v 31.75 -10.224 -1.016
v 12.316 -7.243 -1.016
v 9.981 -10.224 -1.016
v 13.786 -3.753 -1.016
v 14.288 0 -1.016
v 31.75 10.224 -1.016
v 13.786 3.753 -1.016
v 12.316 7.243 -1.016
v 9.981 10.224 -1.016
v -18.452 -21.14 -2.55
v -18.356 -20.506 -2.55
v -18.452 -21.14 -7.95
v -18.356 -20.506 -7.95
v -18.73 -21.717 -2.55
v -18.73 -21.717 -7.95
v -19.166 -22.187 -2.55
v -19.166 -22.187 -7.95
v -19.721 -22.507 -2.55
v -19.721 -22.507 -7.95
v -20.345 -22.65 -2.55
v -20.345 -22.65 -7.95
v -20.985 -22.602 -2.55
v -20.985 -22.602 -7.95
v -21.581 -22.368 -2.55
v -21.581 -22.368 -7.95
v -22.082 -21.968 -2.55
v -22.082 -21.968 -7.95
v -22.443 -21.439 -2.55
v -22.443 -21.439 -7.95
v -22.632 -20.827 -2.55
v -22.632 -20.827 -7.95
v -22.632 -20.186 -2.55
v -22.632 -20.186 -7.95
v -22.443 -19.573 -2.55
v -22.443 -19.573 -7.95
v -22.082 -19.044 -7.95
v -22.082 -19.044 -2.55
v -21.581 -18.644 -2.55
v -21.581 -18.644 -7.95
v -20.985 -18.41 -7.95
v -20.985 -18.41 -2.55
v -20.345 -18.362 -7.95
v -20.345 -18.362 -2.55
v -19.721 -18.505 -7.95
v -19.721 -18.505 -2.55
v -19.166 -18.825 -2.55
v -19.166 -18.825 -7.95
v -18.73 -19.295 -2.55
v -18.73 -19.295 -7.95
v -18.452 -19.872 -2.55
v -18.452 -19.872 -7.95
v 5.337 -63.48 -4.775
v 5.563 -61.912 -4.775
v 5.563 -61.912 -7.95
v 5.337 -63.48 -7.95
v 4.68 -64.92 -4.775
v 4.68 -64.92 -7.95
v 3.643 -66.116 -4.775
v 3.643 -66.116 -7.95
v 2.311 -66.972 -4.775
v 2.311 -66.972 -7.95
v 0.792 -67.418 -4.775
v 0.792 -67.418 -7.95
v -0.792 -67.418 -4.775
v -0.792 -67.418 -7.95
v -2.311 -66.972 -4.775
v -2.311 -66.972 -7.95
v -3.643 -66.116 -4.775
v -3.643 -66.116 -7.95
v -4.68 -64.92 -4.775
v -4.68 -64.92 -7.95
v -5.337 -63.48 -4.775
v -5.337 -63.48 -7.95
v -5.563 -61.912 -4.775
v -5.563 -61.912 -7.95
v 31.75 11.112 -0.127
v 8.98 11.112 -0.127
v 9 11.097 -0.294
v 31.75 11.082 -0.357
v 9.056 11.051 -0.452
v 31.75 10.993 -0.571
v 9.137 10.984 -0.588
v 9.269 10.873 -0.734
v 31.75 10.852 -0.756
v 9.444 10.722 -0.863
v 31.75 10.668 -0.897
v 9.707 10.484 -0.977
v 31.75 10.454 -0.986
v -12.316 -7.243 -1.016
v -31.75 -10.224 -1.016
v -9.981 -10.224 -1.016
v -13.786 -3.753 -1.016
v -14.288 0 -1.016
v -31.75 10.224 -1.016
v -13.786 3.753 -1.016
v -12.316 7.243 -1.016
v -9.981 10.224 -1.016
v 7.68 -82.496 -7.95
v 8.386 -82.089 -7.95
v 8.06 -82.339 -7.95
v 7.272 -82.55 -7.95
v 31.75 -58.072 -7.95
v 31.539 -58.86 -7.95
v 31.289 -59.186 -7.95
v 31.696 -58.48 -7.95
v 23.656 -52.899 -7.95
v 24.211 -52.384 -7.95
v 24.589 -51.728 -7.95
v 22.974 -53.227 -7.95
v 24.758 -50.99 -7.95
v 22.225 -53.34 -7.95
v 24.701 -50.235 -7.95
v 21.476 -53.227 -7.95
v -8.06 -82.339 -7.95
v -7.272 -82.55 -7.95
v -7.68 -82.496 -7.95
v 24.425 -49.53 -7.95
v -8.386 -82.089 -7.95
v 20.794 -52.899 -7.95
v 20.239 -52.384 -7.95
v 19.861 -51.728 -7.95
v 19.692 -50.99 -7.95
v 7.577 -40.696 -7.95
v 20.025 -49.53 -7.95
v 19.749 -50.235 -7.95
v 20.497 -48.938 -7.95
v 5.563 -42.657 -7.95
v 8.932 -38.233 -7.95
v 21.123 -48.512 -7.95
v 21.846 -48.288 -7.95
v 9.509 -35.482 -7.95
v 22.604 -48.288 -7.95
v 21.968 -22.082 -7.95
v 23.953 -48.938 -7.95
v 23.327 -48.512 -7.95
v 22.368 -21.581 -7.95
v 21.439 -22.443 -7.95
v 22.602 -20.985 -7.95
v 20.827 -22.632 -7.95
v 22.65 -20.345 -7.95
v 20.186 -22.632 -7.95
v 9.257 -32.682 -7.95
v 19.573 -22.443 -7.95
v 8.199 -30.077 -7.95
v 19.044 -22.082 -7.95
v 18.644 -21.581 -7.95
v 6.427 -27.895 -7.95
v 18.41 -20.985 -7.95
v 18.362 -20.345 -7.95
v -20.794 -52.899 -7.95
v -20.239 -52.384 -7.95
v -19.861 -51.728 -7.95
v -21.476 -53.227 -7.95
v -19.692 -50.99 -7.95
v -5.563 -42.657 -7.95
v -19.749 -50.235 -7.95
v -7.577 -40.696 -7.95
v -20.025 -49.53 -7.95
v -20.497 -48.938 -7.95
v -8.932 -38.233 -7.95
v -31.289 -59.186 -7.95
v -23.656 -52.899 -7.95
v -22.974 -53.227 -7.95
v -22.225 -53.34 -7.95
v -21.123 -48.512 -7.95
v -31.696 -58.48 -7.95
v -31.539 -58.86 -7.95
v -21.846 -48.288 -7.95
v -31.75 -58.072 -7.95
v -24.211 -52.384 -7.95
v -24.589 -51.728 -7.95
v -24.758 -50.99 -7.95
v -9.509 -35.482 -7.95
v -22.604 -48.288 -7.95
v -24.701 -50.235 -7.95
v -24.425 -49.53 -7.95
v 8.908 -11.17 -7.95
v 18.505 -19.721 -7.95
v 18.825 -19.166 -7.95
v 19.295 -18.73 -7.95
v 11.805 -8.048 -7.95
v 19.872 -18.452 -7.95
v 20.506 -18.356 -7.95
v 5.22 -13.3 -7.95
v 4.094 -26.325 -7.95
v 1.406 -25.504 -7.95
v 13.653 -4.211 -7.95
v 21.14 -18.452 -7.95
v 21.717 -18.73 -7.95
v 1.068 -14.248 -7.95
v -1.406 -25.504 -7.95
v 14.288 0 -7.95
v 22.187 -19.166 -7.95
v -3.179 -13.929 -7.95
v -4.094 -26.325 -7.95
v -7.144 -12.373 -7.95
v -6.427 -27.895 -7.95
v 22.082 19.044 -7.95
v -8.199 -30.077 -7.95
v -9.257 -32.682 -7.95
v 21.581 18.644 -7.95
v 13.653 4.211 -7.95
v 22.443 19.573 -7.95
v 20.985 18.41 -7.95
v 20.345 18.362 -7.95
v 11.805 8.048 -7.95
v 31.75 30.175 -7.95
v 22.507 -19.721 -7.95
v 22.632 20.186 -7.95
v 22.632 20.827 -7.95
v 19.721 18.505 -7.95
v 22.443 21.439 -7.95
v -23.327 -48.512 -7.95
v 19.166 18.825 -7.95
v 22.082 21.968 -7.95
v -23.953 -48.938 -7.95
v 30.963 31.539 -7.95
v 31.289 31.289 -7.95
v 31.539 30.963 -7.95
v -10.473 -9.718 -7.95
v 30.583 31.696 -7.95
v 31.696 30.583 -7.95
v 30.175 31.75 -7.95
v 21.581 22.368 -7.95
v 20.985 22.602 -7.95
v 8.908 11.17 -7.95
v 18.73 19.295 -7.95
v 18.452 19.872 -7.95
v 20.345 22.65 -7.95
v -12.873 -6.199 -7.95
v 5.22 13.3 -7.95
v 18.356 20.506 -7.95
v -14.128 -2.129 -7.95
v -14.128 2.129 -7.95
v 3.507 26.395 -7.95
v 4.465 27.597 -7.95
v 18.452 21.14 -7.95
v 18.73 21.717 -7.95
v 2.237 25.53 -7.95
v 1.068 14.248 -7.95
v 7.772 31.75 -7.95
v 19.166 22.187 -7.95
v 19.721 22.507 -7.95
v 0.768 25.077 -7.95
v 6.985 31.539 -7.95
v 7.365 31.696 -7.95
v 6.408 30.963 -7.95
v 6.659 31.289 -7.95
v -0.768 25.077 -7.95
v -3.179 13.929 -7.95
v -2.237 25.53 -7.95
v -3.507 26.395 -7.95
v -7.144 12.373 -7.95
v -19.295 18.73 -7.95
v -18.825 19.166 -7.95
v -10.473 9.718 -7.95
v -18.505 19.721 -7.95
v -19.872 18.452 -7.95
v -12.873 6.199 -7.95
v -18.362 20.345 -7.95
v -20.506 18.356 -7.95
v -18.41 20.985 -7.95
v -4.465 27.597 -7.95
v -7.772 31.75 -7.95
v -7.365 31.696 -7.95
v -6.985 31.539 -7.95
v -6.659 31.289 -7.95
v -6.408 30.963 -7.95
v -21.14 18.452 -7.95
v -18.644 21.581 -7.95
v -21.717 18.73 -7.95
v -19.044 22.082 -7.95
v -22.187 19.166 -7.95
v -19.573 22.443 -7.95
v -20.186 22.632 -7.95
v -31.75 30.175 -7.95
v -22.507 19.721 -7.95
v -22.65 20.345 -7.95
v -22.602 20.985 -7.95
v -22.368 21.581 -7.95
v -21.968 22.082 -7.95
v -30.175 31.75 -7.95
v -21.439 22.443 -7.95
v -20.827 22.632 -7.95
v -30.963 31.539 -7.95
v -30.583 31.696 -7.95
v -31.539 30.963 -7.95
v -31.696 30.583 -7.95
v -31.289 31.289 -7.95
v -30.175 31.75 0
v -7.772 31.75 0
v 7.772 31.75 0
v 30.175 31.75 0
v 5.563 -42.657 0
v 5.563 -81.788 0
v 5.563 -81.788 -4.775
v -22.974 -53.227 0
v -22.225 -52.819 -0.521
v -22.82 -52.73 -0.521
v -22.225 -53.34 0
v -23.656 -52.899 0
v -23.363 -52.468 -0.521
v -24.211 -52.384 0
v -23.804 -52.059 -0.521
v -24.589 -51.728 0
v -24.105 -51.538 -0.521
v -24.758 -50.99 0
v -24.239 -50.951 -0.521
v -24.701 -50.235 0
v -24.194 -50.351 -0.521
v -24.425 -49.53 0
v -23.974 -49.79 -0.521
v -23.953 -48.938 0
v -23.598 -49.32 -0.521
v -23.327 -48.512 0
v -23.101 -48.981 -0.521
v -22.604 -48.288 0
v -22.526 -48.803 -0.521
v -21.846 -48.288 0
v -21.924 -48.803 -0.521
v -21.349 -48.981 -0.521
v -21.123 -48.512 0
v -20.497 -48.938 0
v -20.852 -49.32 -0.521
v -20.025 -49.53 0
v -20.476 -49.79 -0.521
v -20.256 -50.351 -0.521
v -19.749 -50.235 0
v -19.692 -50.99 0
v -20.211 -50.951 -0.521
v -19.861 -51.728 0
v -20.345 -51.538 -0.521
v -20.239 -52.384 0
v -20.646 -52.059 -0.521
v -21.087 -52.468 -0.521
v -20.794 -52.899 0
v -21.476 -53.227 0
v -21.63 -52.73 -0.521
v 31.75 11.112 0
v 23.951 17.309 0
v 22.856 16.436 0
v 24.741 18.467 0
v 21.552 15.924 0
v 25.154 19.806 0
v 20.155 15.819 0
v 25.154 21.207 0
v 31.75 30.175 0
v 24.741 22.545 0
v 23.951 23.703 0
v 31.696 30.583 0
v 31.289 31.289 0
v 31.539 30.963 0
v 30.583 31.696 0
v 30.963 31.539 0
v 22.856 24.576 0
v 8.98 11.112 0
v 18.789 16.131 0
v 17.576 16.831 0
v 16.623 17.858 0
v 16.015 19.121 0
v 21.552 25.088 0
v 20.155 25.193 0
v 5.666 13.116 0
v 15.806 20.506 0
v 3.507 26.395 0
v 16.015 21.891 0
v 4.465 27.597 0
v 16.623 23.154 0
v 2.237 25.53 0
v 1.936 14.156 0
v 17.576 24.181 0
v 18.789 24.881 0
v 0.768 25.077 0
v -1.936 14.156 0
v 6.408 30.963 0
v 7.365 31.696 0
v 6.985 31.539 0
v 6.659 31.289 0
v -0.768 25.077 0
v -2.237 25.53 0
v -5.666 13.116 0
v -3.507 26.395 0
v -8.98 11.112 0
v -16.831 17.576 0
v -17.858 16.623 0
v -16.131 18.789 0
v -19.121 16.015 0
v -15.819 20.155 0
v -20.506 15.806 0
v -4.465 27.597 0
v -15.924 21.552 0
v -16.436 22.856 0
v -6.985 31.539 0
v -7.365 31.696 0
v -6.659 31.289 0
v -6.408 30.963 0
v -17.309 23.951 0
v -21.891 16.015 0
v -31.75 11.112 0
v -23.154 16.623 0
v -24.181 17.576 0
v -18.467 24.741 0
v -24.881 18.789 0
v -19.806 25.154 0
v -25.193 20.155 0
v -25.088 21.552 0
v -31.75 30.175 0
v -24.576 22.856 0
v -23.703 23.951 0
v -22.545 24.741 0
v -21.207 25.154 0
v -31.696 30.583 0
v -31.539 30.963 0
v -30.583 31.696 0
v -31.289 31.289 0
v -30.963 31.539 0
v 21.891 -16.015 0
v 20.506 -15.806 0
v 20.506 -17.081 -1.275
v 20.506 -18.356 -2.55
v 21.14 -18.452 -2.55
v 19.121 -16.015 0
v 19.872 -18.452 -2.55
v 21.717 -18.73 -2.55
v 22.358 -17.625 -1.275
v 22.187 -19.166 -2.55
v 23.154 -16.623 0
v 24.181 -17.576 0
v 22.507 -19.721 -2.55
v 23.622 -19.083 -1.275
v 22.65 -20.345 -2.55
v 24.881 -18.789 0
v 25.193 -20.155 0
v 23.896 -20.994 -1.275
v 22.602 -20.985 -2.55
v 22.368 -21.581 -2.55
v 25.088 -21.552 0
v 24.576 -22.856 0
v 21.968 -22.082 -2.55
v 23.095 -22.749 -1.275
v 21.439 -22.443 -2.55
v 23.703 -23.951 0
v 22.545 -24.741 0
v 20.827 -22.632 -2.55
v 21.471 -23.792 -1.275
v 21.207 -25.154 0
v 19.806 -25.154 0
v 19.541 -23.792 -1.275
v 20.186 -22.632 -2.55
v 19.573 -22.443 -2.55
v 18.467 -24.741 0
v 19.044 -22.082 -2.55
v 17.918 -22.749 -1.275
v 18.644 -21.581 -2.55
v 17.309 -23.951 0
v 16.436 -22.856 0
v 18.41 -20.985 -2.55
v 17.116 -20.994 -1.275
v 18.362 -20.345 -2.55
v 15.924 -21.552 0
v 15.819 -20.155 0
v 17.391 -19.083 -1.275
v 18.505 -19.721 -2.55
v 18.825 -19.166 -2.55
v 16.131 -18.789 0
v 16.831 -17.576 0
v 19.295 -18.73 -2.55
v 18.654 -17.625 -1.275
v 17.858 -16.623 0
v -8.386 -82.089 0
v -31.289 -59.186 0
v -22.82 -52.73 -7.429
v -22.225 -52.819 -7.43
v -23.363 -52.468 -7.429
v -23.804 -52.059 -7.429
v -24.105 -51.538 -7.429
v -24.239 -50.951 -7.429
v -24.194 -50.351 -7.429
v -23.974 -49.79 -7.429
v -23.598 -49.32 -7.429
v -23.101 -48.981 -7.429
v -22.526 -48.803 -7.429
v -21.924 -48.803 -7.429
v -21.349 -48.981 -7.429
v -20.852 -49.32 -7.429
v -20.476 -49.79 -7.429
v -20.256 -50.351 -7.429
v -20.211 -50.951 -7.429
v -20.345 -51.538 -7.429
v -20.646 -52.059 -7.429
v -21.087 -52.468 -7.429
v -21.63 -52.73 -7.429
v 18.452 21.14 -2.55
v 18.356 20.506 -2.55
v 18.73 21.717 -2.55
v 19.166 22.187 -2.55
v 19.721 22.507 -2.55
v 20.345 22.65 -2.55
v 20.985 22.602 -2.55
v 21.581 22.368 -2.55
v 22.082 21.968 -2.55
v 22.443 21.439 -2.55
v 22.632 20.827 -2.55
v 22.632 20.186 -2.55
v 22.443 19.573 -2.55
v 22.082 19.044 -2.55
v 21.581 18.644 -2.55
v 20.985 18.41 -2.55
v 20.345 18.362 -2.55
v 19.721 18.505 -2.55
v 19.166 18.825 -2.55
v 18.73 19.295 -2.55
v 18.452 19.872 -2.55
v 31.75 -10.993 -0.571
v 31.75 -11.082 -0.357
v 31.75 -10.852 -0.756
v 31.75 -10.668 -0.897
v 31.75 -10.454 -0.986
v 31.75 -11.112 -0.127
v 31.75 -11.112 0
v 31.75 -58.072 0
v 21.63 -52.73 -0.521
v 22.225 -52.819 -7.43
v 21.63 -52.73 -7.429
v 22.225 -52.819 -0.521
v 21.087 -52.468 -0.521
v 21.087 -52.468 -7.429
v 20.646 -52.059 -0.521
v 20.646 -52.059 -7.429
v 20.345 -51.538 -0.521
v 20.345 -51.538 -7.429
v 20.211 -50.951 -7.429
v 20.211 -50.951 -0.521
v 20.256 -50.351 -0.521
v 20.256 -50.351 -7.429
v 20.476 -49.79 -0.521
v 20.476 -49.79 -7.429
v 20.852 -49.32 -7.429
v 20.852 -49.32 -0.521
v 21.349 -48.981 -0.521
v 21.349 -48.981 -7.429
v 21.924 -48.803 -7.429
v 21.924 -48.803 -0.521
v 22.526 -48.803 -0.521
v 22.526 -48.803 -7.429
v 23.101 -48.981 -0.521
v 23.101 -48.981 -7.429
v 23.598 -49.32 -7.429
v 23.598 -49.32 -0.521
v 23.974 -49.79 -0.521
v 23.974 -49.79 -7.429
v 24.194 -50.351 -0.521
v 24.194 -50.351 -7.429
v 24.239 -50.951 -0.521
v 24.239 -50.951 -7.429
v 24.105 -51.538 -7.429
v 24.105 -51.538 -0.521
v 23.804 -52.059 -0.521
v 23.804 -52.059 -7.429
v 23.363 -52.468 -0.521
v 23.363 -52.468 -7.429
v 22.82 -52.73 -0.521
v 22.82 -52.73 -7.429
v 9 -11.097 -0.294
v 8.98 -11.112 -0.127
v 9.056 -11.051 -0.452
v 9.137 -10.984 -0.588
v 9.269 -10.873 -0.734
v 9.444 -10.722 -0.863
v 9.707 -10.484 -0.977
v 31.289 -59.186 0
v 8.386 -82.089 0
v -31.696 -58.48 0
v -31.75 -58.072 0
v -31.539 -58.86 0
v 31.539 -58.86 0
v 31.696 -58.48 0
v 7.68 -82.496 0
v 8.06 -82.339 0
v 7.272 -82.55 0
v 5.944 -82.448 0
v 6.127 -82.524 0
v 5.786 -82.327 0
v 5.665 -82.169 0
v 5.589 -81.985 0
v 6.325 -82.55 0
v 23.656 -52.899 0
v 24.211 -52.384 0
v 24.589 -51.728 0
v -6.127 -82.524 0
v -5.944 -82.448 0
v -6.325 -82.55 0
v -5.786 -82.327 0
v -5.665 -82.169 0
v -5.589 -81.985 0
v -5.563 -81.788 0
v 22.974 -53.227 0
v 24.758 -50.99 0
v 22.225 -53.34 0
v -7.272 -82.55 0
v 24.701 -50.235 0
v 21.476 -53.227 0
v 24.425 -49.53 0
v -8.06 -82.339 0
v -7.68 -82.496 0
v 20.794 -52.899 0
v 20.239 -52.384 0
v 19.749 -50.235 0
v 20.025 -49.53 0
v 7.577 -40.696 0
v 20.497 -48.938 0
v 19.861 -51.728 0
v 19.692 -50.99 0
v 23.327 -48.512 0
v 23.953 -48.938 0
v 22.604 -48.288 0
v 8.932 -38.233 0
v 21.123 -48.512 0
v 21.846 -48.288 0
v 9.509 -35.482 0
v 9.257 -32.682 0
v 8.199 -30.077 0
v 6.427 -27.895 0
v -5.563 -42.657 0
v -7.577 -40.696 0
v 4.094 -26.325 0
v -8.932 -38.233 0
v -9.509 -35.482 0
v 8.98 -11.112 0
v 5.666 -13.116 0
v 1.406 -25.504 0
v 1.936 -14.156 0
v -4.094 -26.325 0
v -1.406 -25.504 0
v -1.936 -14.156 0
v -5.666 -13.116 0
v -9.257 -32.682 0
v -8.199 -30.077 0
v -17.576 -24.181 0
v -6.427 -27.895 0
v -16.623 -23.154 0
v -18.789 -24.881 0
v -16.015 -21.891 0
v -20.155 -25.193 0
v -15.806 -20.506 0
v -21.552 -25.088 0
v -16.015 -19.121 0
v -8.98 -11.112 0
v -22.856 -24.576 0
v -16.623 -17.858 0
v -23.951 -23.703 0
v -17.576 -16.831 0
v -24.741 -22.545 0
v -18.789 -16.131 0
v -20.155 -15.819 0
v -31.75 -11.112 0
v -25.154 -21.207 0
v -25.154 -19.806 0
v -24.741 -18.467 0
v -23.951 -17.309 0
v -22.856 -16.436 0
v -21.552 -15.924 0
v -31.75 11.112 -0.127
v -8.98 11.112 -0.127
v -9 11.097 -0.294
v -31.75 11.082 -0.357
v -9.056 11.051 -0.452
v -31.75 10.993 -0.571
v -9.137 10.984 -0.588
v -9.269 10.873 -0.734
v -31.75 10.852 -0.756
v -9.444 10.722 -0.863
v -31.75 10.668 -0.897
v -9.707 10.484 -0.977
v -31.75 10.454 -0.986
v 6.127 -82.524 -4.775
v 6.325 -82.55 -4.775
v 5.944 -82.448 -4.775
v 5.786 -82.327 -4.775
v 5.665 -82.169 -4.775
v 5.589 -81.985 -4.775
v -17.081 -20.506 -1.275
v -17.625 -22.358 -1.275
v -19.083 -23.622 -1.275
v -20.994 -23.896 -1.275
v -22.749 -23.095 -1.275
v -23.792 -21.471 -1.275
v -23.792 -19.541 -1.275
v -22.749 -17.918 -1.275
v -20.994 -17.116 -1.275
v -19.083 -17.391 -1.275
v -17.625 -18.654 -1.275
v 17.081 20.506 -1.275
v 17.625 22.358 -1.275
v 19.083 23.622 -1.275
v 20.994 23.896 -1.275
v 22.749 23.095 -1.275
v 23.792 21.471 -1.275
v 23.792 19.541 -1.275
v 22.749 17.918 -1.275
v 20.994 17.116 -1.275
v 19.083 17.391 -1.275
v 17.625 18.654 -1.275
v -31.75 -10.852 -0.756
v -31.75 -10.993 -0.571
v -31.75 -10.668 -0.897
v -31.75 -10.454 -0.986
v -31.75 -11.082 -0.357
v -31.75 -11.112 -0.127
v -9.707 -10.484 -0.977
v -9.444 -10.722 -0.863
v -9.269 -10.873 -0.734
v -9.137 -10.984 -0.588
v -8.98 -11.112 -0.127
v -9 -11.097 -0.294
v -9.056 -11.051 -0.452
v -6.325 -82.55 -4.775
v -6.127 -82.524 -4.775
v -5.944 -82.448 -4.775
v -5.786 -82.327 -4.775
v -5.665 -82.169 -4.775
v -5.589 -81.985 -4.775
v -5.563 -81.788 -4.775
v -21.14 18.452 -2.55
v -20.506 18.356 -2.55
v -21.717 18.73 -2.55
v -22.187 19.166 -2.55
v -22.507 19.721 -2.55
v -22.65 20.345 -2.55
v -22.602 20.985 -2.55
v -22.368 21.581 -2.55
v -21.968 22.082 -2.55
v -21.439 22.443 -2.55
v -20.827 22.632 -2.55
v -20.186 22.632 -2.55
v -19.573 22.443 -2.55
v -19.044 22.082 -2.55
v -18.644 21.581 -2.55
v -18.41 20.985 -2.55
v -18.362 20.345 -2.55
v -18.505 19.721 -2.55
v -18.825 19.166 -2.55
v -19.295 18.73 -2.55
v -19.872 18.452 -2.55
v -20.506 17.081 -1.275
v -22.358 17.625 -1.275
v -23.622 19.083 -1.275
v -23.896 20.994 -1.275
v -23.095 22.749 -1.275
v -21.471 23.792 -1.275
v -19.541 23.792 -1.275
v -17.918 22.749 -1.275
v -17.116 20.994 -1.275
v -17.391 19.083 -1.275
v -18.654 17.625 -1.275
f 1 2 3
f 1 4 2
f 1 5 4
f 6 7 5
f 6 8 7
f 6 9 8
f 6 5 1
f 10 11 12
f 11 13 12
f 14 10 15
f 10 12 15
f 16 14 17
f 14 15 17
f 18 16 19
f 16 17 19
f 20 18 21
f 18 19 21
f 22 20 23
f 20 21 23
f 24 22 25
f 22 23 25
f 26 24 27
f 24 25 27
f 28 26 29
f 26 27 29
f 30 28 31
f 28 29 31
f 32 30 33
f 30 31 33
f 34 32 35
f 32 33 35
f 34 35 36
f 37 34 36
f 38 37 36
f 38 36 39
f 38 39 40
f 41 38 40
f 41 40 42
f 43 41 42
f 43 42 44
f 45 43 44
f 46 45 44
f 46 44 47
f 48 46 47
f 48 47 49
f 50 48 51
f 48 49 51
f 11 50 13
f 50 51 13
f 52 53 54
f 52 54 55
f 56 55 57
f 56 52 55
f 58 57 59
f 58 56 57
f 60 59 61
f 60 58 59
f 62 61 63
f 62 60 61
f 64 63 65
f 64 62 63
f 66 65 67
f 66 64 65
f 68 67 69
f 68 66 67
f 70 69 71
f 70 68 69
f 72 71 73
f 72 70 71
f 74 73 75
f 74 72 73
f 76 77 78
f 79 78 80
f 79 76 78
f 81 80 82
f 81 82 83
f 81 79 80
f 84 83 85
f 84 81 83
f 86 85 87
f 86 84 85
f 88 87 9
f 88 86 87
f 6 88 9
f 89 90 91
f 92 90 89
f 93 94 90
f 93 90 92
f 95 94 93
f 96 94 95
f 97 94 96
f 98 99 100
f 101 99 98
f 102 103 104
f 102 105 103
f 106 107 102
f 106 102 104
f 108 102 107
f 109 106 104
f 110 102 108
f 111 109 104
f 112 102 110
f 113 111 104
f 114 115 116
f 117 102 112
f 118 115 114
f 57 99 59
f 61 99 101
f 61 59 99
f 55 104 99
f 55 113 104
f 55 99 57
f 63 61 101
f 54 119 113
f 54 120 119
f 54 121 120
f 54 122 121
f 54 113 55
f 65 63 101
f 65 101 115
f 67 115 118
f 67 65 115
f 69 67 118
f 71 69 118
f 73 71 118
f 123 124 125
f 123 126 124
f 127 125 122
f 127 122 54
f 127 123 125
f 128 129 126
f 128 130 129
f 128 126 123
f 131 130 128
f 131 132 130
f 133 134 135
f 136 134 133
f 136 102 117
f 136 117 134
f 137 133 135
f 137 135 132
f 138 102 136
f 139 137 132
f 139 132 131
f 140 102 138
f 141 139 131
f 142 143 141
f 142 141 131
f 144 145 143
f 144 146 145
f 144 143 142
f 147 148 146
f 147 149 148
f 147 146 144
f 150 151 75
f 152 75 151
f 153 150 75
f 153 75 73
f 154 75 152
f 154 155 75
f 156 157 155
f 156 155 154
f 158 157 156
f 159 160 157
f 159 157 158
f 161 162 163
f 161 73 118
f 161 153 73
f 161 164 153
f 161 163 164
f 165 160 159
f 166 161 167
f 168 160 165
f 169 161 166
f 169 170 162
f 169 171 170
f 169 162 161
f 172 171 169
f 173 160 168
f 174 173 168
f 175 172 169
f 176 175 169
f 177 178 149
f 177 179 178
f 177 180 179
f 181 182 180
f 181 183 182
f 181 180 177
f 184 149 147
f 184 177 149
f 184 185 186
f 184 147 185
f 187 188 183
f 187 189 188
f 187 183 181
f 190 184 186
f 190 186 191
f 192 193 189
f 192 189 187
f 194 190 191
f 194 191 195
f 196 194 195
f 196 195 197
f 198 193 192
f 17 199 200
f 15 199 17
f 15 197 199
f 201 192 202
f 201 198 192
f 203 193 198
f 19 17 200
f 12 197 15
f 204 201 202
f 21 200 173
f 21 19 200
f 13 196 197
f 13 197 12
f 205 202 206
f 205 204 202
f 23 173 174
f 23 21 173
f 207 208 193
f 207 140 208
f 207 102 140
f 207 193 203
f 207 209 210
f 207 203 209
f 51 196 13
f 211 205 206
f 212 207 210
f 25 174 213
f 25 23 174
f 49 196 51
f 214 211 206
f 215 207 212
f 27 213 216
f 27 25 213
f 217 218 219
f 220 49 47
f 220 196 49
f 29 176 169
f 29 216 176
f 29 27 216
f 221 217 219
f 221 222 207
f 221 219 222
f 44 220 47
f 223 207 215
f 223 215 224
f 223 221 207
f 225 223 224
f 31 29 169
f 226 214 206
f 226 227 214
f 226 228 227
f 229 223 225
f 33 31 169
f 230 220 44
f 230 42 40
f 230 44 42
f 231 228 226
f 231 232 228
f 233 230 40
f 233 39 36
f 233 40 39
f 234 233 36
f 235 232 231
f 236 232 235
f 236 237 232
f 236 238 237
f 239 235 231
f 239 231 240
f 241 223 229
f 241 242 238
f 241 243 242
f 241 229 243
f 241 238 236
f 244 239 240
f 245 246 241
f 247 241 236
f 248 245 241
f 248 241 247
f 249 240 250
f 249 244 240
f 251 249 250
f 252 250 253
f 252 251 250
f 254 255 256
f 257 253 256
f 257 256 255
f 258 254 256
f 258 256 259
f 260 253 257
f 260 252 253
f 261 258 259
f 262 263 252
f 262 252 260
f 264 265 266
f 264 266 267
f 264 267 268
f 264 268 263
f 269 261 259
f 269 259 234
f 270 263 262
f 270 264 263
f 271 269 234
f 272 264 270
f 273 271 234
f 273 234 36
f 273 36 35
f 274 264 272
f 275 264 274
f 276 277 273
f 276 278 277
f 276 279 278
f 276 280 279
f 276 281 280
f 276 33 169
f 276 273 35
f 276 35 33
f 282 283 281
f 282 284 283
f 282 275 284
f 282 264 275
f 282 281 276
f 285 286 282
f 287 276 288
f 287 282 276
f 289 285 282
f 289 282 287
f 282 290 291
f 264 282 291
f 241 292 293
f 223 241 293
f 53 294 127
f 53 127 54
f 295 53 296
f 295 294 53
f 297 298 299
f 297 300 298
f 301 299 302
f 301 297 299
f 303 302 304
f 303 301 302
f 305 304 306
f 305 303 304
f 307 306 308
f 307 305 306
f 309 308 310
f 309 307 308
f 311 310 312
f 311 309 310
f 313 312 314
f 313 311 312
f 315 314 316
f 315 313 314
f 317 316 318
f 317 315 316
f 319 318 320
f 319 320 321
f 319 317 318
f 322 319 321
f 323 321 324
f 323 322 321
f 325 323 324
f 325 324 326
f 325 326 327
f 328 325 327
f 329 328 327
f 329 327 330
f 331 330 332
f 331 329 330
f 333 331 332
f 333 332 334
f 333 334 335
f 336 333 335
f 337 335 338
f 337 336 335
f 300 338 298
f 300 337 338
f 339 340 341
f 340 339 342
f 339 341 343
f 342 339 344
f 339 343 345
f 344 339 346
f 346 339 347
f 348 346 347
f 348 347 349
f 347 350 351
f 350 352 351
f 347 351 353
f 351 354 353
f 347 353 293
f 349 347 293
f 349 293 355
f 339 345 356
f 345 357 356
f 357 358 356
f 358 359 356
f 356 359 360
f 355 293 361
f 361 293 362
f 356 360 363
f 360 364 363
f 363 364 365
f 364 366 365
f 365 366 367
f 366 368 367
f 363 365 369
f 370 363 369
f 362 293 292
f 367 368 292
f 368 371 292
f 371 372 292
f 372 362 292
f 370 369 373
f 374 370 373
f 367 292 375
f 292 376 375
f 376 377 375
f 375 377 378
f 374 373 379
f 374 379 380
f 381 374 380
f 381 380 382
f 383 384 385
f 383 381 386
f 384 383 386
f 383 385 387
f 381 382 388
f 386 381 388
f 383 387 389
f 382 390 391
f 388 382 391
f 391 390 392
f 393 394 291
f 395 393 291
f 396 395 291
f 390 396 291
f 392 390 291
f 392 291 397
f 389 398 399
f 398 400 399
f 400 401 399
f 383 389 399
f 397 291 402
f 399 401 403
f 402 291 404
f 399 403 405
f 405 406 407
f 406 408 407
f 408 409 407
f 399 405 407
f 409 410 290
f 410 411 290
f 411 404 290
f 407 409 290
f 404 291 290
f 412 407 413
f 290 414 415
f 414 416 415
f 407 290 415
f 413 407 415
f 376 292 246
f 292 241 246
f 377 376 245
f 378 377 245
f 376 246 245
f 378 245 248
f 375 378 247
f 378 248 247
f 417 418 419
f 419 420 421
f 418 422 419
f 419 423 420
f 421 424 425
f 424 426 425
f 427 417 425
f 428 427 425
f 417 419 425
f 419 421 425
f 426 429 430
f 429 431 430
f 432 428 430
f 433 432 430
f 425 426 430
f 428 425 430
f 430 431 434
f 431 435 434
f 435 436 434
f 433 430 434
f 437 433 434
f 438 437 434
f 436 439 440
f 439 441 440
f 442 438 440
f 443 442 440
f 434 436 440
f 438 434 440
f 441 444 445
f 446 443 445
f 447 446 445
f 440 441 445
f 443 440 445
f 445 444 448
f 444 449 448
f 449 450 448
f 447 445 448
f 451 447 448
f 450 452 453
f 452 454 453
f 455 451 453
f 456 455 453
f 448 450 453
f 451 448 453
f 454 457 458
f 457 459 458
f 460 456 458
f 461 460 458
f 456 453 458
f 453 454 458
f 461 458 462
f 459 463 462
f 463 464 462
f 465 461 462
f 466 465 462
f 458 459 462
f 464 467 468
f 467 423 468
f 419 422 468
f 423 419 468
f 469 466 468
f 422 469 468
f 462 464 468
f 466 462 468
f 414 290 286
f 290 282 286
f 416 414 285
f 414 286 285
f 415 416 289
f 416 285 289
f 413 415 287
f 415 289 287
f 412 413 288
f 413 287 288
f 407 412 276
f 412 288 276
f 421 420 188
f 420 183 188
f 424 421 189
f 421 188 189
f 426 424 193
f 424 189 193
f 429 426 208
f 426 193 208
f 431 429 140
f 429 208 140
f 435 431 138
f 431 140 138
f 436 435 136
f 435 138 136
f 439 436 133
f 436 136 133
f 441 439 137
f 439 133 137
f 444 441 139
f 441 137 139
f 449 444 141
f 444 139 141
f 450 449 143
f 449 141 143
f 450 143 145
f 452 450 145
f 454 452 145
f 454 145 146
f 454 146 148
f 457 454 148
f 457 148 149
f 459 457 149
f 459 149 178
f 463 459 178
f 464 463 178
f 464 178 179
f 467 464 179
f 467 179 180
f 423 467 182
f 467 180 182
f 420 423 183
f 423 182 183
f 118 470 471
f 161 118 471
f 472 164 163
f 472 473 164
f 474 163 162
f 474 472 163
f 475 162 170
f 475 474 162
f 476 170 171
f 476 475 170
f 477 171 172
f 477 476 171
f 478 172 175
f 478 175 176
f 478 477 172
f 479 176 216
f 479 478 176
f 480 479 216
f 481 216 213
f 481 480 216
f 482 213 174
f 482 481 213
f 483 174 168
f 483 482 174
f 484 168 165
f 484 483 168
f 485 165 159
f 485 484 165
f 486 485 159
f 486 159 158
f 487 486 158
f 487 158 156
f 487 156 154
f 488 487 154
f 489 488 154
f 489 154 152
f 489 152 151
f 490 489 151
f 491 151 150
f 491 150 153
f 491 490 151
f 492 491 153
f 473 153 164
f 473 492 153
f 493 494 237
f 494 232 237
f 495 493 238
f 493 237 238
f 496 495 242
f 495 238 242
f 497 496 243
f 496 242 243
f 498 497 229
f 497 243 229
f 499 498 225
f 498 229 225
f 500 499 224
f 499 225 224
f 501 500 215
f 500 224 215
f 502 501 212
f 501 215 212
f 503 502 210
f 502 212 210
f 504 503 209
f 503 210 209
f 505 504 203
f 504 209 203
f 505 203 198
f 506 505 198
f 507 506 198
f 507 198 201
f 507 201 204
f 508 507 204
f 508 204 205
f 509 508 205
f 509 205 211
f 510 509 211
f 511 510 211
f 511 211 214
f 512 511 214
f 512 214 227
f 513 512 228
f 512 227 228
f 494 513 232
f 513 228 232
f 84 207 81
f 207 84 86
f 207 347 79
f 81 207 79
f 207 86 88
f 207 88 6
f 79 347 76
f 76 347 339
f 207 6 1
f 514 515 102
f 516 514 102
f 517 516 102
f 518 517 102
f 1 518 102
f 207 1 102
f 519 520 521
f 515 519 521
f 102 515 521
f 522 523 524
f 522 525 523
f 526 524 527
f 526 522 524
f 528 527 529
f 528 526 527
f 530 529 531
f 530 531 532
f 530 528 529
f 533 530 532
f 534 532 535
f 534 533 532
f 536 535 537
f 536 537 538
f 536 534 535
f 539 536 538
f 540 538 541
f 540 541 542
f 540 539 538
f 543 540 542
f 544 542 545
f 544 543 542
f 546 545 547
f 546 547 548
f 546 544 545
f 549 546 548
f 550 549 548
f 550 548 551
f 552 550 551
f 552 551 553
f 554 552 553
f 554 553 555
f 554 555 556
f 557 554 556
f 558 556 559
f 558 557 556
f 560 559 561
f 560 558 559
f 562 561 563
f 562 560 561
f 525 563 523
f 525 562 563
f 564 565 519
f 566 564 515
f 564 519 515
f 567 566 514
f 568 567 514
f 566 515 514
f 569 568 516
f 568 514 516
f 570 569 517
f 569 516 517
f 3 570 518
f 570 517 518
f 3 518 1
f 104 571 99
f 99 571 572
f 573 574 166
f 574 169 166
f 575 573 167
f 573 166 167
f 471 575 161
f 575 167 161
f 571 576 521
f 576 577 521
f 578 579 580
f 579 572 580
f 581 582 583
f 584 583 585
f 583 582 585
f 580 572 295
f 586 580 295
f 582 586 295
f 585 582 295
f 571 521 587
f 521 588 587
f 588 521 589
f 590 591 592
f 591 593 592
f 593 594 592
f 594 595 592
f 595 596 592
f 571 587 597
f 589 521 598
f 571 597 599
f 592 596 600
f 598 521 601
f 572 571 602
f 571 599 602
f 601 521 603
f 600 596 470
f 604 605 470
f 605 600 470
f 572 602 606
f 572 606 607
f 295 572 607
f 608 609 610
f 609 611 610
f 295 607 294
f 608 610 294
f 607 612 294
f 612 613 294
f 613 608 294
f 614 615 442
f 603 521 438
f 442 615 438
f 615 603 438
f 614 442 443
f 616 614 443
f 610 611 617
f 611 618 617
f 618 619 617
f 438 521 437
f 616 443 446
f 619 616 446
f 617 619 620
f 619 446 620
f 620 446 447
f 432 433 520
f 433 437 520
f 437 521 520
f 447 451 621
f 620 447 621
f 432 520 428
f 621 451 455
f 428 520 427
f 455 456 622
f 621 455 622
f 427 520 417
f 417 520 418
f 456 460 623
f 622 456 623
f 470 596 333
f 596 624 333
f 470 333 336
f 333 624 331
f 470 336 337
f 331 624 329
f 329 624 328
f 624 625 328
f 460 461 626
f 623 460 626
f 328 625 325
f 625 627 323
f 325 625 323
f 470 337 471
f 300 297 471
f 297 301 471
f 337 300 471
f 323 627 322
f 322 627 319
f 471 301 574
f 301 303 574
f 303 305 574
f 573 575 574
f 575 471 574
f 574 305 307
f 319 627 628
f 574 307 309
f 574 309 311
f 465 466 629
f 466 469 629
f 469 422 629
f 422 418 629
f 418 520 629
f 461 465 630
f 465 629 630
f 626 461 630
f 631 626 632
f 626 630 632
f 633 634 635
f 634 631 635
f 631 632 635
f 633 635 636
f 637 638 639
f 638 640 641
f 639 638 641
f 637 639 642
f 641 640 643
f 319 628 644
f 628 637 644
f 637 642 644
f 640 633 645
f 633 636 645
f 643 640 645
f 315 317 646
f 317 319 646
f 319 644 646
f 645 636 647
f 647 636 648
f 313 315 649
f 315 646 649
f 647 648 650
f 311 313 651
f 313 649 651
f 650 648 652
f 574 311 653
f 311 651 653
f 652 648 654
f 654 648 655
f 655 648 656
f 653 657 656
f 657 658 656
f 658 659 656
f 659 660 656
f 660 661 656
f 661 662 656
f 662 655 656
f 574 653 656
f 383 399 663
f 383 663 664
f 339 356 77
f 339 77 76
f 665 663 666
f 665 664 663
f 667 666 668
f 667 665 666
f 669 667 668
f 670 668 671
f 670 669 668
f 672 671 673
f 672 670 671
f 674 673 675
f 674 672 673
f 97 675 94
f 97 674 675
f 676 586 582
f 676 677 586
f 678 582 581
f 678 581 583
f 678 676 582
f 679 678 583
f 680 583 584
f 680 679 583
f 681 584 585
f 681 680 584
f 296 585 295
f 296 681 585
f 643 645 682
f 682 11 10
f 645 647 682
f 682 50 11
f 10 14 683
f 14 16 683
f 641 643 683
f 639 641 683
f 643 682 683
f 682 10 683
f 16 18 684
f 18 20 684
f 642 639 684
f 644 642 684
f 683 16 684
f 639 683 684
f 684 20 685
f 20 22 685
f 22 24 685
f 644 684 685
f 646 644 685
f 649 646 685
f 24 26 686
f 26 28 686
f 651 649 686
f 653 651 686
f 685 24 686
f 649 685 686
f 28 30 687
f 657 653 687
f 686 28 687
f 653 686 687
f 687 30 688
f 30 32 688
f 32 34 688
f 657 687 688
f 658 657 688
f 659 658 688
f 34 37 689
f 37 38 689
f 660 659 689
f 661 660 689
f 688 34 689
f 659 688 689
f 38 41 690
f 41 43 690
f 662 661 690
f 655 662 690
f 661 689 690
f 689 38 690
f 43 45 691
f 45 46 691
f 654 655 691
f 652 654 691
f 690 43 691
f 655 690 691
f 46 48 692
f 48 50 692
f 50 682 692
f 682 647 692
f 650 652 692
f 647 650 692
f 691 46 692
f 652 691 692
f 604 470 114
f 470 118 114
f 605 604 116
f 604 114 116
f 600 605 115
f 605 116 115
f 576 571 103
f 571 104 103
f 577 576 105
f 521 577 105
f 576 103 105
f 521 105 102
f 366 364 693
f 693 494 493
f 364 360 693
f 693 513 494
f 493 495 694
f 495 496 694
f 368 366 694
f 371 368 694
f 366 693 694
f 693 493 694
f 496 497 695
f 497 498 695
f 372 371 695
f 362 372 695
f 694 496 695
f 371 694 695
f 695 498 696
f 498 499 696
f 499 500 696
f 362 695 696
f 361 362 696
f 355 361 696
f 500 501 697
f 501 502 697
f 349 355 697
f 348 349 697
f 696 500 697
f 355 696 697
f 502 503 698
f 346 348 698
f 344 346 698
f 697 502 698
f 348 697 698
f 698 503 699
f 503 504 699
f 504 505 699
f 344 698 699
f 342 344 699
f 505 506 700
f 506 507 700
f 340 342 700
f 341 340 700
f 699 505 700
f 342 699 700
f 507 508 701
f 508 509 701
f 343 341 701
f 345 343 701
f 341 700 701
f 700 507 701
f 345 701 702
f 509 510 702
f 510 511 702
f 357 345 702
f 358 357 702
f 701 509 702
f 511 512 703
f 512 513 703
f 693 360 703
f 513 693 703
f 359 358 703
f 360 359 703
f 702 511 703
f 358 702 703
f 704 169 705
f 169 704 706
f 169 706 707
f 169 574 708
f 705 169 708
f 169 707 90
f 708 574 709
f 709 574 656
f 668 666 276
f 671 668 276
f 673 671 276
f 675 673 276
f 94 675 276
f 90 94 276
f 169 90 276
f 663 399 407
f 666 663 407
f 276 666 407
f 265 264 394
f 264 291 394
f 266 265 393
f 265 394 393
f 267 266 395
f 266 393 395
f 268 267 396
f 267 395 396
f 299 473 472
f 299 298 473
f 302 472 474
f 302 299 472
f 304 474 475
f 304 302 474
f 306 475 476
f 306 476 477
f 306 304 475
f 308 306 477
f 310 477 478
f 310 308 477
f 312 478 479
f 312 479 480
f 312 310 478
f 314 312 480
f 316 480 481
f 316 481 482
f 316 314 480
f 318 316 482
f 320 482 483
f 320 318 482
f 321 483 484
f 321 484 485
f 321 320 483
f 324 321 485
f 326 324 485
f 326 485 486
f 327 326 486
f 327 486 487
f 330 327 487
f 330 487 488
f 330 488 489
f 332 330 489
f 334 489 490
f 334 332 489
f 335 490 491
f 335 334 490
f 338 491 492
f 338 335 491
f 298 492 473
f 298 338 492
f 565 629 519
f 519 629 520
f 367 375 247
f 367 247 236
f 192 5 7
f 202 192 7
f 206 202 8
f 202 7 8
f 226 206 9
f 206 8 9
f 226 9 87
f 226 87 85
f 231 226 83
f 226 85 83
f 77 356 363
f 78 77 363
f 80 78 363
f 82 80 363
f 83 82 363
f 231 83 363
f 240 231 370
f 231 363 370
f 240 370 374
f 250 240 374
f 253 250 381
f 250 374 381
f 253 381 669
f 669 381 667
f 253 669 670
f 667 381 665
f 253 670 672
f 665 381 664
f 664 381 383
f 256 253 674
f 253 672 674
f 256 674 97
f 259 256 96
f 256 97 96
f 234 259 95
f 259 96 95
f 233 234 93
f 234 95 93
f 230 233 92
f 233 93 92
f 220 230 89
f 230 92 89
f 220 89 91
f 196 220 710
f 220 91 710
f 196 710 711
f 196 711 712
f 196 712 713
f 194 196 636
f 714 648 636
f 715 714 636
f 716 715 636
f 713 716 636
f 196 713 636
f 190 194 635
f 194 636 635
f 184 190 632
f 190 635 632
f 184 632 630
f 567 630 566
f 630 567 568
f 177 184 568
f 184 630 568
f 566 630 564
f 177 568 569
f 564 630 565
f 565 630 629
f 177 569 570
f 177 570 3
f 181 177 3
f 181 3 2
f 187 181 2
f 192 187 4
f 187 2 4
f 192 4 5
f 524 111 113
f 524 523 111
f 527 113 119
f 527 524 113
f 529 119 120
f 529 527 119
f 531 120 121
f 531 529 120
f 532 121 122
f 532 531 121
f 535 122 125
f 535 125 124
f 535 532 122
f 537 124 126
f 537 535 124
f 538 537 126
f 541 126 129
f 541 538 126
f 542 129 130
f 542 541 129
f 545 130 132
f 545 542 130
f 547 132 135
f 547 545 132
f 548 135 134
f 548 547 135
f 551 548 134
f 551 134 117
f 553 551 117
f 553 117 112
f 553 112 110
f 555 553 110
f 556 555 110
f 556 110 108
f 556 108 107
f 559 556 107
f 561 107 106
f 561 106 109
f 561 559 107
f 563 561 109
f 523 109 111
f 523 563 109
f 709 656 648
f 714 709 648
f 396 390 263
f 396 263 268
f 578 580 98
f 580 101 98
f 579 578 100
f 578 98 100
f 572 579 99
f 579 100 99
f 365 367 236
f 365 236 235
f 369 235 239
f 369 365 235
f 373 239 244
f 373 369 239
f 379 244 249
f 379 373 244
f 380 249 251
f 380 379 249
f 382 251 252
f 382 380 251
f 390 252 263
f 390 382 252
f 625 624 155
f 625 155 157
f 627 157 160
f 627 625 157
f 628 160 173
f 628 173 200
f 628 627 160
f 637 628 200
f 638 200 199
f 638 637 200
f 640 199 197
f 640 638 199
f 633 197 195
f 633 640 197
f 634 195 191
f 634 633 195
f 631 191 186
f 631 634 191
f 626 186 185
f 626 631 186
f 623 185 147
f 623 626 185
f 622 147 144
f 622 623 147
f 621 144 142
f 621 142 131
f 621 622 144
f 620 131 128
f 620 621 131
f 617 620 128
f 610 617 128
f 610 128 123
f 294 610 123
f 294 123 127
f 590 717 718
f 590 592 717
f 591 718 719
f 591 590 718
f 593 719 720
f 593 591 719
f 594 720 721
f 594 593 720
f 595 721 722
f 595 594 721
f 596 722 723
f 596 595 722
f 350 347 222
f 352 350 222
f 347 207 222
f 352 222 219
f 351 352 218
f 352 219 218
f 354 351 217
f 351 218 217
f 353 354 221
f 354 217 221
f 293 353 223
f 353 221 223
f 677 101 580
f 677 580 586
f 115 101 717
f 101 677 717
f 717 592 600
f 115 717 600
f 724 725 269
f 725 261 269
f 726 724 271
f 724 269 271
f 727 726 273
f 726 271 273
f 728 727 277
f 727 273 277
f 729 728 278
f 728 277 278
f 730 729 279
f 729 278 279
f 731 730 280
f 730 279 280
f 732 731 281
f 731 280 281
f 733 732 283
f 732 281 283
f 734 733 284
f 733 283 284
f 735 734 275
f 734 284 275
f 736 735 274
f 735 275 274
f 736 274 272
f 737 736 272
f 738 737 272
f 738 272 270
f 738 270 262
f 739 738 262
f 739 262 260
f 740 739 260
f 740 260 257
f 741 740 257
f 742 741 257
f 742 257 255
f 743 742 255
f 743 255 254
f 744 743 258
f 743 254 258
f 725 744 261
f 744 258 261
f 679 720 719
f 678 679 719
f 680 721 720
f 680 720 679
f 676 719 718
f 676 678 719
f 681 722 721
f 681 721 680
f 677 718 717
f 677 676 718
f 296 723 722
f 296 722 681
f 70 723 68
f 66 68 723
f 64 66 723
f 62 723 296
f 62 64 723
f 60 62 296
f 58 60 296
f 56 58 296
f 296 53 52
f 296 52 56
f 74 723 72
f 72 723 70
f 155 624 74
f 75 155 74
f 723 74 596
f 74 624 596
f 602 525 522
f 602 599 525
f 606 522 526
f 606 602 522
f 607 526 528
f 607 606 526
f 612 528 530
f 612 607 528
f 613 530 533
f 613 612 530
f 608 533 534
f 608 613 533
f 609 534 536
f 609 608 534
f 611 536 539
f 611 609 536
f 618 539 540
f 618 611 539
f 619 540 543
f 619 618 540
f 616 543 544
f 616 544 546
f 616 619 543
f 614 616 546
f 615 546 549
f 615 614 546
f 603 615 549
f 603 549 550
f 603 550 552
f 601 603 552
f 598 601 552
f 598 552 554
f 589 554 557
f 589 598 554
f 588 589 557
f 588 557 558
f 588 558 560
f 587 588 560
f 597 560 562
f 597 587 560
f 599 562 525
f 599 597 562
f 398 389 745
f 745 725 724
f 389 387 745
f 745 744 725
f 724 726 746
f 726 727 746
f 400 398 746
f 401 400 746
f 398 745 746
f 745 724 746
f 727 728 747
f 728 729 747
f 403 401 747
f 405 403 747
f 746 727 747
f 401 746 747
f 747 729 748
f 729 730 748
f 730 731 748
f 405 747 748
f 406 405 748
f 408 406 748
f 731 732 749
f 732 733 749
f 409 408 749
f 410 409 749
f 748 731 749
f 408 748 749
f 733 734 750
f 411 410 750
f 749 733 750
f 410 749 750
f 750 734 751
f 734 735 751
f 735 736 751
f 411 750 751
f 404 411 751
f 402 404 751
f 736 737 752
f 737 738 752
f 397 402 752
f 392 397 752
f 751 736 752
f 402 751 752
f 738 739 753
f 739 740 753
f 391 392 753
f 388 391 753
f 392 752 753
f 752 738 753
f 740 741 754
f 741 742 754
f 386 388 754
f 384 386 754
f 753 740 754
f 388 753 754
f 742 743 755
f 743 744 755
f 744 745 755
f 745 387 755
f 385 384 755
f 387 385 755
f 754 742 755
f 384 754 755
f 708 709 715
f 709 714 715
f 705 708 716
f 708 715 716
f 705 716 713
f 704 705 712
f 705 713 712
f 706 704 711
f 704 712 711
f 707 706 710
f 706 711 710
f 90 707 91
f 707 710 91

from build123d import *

# Parameters (mm, degrees)
SKETCH1_R                                       = 14.2875
BOSS_EXTRUDE1_DEPTH                             = 7.9502
CUT_EXTRUDE1_DEPTH                              = 4.7752
CSK_FOR_M4_FLAT_HEAD_MACHINE_SCREW1_D           = 4.3
CSK_FOR_M4_FLAT_HEAD_MACHINE_SCREW1_CSINK_D     = 9.4
CSK_FOR_M4_FLAT_HEAD_MACHINE_SCREW1_CSINK_ANGLE = 90
CIRPATTERN1_COUNT                               = 4
F_10_32_TAPPED_HOLE1_AT_2_COUNT                 = 2
F_10_32_TAPPED_HOLE1_AT_2_PITCH                 = 44.45
CUT_EXTRUDE2_DEPTH                              = 89.801861918
FILLET1_R                                       = 1.5748
FILLET2_R                                       = 0.762
SKETCH12_W                                      = 73.210736231
SKETCH12_H                                      = 22.225
CUT_EXTRUDE3_DEPTH                              = 1.016
FILLET3_R                                       = 0.889


with BuildPart() as part:
    # Sketch1 → Boss-Extrude1 (new body)
    with BuildSketch(Plane.XY):
        Polygon((-31.75, 31.75), (31.75, 31.75), (31.75, -58.7248), (7.9248, -82.55), (-7.9248, -82.55), (-31.75, -58.7248), align=None)
        Circle(SKETCH1_R, mode=Mode.SUBTRACT)
        with BuildLine():
            Line((5.5626, -42.656953585), (5.5626, -61.9125))
            ThreePointArc((5.5626, -61.9125), (0, -67.4751), (-5.5626, -61.9125))
            Line((-5.5626, -61.9125), (-5.5626, -42.656953585))
            ThreePointArc((-5.5626, -42.656953585), (0, -25.4), (5.5626, -42.656953585))
        make_face(mode=Mode.SUBTRACT)
    extrude(amount=-BOSS_EXTRUDE1_DEPTH)

    # Sketch4 → Cut-Extrude1 (cut)
    with BuildSketch(Plane.XY):
        with BuildLine():
            Line((5.5626, -111.125), (5.5626, -34.925))
            ThreePointArc((5.5626, -34.925), (0, -29.3624), (-5.5626, -34.925))
            Line((-5.5626, -34.925), (-5.5626, -111.125))
            Line((-5.5626, -111.125), (5.5626, -111.125))
        make_face()
    extrude(amount=-CUT_EXTRUDE1_DEPTH, mode=Mode.SUBTRACT)

    # CSK for M4 Flat Head Machine Screw1 (through all)
    with Locations(Plane.XY):
        with Locations((20.506096654, 20.506096654)):
            csk_for_m4_flat_head_machine_screw1 = CounterSinkHole(CSK_FOR_M4_FLAT_HEAD_MACHINE_SCREW1_D / 2, CSK_FOR_M4_FLAT_HEAD_MACHINE_SCREW1_CSINK_D / 2, counter_sink_angle=CSK_FOR_M4_FLAT_HEAD_MACHINE_SCREW1_CSINK_ANGLE)

    # CirPattern1: CSK for M4 Flat Head Machine Screw1 ×4 about axis
    cirpattern1_axis = Axis((0, 0, 0), (0, 0, 1))
    for i in range(1, CIRPATTERN1_COUNT):
        add(csk_for_m4_flat_head_machine_screw1.rotate(cirpattern1_axis, i * 360 / CIRPATTERN1_COUNT), mode=Mode.SUBTRACT)

    # Sketch7 → #10-32 Tapped Hole1 (revolve, cut)
    with BuildSketch(Plane(origin=(22.225, -50.8, 0), x_dir=(0, -1, 0), z_dir=(1, 0, 0))):
        Polygon((0, 0), (0, 7.9502), (2.54, 7.9502), (2.0193, 7.4295), (2.0193, 0.5207), (2.54, 0), align=None)
    f_10_32_tapped_hole1 = revolve(axis=Axis((22.225, -50.8, 6.35), (0, 0, -1)), mode=Mode.SUBTRACT)

    # #10-32 Tapped Hole1 at 2: #10-32 Tapped Hole1 ×2
    with Locations(*[(-i * F_10_32_TAPPED_HOLE1_AT_2_PITCH, 0, 0) for i in range(1, F_10_32_TAPPED_HOLE1_AT_2_COUNT)]):
        add(f_10_32_tapped_hole1, mode=Mode.SUBTRACT)

    # Sketch8 → Cut-Extrude2 (cut, through all)
    with BuildSketch(Plane.XY):
        with BuildLine():
            Line((-4.465400187, 27.5971), (-13.062271505, 42.487317908))
            Line((-13.062271505, 42.487317908), (13.062271505, 42.487317908))
            Line((13.062271505, 42.487317908), (4.465400187, 27.5971))
            ThreePointArc((4.465400187, 27.5971), (0, 25.019), (-4.465400187, 27.5971))
        make_face()
    extrude(amount=-CUT_EXTRUDE2_DEPTH, mode=Mode.SUBTRACT)

    # Fillet1
    fillet1_edges = [part.edges().sort_by_distance(p)[0] for p in [
        (-31.75, 31.75, -3.9751),
        (31.75, 31.75, -3.9751),
        (31.75, -58.7248, -3.9751),
        (7.9248, -82.55, -3.9751),
        (-7.9248, -82.55, -3.9751),
        (-31.75, -58.7248, -3.9751),
        (-6.86307812, 31.75, -3.9751),
        (6.86307812, 31.75, -3.9751),
    ]]
    fillet(fillet1_edges, radius=FILLET1_R)

    # Fillet2
    fillet2_edges = [part.edges().sort_by_distance(p)[0] for p in [
        (-5.5626, -82.55, -2.3876),
        (5.5626, -82.55, -2.3876),
    ]]
    fillet(fillet2_edges, radius=FILLET2_R)

    # Sketch12 → Cut-Extrude3 (cut)
    with BuildSketch(Plane.XY):
        with Locations((0.072940044, 0)):
            Rectangle(SKETCH12_W, SKETCH12_H)
    extrude(amount=-CUT_EXTRUDE3_DEPTH, mode=Mode.SUBTRACT)

    # Fillet3
    fillet3_edges = [part.edges().sort_by_distance(p)[0] for p in [
        (20.365128061, -11.1125, -1.016),
        (-20.365128061, -11.1125, -1.016),
        (-20.365128061, 11.1125, -1.016),
        (20.365128061, 11.1125, -1.016),
    ]]
    fillet(fillet3_edges, radius=FILLET3_R)


solid = part.part
